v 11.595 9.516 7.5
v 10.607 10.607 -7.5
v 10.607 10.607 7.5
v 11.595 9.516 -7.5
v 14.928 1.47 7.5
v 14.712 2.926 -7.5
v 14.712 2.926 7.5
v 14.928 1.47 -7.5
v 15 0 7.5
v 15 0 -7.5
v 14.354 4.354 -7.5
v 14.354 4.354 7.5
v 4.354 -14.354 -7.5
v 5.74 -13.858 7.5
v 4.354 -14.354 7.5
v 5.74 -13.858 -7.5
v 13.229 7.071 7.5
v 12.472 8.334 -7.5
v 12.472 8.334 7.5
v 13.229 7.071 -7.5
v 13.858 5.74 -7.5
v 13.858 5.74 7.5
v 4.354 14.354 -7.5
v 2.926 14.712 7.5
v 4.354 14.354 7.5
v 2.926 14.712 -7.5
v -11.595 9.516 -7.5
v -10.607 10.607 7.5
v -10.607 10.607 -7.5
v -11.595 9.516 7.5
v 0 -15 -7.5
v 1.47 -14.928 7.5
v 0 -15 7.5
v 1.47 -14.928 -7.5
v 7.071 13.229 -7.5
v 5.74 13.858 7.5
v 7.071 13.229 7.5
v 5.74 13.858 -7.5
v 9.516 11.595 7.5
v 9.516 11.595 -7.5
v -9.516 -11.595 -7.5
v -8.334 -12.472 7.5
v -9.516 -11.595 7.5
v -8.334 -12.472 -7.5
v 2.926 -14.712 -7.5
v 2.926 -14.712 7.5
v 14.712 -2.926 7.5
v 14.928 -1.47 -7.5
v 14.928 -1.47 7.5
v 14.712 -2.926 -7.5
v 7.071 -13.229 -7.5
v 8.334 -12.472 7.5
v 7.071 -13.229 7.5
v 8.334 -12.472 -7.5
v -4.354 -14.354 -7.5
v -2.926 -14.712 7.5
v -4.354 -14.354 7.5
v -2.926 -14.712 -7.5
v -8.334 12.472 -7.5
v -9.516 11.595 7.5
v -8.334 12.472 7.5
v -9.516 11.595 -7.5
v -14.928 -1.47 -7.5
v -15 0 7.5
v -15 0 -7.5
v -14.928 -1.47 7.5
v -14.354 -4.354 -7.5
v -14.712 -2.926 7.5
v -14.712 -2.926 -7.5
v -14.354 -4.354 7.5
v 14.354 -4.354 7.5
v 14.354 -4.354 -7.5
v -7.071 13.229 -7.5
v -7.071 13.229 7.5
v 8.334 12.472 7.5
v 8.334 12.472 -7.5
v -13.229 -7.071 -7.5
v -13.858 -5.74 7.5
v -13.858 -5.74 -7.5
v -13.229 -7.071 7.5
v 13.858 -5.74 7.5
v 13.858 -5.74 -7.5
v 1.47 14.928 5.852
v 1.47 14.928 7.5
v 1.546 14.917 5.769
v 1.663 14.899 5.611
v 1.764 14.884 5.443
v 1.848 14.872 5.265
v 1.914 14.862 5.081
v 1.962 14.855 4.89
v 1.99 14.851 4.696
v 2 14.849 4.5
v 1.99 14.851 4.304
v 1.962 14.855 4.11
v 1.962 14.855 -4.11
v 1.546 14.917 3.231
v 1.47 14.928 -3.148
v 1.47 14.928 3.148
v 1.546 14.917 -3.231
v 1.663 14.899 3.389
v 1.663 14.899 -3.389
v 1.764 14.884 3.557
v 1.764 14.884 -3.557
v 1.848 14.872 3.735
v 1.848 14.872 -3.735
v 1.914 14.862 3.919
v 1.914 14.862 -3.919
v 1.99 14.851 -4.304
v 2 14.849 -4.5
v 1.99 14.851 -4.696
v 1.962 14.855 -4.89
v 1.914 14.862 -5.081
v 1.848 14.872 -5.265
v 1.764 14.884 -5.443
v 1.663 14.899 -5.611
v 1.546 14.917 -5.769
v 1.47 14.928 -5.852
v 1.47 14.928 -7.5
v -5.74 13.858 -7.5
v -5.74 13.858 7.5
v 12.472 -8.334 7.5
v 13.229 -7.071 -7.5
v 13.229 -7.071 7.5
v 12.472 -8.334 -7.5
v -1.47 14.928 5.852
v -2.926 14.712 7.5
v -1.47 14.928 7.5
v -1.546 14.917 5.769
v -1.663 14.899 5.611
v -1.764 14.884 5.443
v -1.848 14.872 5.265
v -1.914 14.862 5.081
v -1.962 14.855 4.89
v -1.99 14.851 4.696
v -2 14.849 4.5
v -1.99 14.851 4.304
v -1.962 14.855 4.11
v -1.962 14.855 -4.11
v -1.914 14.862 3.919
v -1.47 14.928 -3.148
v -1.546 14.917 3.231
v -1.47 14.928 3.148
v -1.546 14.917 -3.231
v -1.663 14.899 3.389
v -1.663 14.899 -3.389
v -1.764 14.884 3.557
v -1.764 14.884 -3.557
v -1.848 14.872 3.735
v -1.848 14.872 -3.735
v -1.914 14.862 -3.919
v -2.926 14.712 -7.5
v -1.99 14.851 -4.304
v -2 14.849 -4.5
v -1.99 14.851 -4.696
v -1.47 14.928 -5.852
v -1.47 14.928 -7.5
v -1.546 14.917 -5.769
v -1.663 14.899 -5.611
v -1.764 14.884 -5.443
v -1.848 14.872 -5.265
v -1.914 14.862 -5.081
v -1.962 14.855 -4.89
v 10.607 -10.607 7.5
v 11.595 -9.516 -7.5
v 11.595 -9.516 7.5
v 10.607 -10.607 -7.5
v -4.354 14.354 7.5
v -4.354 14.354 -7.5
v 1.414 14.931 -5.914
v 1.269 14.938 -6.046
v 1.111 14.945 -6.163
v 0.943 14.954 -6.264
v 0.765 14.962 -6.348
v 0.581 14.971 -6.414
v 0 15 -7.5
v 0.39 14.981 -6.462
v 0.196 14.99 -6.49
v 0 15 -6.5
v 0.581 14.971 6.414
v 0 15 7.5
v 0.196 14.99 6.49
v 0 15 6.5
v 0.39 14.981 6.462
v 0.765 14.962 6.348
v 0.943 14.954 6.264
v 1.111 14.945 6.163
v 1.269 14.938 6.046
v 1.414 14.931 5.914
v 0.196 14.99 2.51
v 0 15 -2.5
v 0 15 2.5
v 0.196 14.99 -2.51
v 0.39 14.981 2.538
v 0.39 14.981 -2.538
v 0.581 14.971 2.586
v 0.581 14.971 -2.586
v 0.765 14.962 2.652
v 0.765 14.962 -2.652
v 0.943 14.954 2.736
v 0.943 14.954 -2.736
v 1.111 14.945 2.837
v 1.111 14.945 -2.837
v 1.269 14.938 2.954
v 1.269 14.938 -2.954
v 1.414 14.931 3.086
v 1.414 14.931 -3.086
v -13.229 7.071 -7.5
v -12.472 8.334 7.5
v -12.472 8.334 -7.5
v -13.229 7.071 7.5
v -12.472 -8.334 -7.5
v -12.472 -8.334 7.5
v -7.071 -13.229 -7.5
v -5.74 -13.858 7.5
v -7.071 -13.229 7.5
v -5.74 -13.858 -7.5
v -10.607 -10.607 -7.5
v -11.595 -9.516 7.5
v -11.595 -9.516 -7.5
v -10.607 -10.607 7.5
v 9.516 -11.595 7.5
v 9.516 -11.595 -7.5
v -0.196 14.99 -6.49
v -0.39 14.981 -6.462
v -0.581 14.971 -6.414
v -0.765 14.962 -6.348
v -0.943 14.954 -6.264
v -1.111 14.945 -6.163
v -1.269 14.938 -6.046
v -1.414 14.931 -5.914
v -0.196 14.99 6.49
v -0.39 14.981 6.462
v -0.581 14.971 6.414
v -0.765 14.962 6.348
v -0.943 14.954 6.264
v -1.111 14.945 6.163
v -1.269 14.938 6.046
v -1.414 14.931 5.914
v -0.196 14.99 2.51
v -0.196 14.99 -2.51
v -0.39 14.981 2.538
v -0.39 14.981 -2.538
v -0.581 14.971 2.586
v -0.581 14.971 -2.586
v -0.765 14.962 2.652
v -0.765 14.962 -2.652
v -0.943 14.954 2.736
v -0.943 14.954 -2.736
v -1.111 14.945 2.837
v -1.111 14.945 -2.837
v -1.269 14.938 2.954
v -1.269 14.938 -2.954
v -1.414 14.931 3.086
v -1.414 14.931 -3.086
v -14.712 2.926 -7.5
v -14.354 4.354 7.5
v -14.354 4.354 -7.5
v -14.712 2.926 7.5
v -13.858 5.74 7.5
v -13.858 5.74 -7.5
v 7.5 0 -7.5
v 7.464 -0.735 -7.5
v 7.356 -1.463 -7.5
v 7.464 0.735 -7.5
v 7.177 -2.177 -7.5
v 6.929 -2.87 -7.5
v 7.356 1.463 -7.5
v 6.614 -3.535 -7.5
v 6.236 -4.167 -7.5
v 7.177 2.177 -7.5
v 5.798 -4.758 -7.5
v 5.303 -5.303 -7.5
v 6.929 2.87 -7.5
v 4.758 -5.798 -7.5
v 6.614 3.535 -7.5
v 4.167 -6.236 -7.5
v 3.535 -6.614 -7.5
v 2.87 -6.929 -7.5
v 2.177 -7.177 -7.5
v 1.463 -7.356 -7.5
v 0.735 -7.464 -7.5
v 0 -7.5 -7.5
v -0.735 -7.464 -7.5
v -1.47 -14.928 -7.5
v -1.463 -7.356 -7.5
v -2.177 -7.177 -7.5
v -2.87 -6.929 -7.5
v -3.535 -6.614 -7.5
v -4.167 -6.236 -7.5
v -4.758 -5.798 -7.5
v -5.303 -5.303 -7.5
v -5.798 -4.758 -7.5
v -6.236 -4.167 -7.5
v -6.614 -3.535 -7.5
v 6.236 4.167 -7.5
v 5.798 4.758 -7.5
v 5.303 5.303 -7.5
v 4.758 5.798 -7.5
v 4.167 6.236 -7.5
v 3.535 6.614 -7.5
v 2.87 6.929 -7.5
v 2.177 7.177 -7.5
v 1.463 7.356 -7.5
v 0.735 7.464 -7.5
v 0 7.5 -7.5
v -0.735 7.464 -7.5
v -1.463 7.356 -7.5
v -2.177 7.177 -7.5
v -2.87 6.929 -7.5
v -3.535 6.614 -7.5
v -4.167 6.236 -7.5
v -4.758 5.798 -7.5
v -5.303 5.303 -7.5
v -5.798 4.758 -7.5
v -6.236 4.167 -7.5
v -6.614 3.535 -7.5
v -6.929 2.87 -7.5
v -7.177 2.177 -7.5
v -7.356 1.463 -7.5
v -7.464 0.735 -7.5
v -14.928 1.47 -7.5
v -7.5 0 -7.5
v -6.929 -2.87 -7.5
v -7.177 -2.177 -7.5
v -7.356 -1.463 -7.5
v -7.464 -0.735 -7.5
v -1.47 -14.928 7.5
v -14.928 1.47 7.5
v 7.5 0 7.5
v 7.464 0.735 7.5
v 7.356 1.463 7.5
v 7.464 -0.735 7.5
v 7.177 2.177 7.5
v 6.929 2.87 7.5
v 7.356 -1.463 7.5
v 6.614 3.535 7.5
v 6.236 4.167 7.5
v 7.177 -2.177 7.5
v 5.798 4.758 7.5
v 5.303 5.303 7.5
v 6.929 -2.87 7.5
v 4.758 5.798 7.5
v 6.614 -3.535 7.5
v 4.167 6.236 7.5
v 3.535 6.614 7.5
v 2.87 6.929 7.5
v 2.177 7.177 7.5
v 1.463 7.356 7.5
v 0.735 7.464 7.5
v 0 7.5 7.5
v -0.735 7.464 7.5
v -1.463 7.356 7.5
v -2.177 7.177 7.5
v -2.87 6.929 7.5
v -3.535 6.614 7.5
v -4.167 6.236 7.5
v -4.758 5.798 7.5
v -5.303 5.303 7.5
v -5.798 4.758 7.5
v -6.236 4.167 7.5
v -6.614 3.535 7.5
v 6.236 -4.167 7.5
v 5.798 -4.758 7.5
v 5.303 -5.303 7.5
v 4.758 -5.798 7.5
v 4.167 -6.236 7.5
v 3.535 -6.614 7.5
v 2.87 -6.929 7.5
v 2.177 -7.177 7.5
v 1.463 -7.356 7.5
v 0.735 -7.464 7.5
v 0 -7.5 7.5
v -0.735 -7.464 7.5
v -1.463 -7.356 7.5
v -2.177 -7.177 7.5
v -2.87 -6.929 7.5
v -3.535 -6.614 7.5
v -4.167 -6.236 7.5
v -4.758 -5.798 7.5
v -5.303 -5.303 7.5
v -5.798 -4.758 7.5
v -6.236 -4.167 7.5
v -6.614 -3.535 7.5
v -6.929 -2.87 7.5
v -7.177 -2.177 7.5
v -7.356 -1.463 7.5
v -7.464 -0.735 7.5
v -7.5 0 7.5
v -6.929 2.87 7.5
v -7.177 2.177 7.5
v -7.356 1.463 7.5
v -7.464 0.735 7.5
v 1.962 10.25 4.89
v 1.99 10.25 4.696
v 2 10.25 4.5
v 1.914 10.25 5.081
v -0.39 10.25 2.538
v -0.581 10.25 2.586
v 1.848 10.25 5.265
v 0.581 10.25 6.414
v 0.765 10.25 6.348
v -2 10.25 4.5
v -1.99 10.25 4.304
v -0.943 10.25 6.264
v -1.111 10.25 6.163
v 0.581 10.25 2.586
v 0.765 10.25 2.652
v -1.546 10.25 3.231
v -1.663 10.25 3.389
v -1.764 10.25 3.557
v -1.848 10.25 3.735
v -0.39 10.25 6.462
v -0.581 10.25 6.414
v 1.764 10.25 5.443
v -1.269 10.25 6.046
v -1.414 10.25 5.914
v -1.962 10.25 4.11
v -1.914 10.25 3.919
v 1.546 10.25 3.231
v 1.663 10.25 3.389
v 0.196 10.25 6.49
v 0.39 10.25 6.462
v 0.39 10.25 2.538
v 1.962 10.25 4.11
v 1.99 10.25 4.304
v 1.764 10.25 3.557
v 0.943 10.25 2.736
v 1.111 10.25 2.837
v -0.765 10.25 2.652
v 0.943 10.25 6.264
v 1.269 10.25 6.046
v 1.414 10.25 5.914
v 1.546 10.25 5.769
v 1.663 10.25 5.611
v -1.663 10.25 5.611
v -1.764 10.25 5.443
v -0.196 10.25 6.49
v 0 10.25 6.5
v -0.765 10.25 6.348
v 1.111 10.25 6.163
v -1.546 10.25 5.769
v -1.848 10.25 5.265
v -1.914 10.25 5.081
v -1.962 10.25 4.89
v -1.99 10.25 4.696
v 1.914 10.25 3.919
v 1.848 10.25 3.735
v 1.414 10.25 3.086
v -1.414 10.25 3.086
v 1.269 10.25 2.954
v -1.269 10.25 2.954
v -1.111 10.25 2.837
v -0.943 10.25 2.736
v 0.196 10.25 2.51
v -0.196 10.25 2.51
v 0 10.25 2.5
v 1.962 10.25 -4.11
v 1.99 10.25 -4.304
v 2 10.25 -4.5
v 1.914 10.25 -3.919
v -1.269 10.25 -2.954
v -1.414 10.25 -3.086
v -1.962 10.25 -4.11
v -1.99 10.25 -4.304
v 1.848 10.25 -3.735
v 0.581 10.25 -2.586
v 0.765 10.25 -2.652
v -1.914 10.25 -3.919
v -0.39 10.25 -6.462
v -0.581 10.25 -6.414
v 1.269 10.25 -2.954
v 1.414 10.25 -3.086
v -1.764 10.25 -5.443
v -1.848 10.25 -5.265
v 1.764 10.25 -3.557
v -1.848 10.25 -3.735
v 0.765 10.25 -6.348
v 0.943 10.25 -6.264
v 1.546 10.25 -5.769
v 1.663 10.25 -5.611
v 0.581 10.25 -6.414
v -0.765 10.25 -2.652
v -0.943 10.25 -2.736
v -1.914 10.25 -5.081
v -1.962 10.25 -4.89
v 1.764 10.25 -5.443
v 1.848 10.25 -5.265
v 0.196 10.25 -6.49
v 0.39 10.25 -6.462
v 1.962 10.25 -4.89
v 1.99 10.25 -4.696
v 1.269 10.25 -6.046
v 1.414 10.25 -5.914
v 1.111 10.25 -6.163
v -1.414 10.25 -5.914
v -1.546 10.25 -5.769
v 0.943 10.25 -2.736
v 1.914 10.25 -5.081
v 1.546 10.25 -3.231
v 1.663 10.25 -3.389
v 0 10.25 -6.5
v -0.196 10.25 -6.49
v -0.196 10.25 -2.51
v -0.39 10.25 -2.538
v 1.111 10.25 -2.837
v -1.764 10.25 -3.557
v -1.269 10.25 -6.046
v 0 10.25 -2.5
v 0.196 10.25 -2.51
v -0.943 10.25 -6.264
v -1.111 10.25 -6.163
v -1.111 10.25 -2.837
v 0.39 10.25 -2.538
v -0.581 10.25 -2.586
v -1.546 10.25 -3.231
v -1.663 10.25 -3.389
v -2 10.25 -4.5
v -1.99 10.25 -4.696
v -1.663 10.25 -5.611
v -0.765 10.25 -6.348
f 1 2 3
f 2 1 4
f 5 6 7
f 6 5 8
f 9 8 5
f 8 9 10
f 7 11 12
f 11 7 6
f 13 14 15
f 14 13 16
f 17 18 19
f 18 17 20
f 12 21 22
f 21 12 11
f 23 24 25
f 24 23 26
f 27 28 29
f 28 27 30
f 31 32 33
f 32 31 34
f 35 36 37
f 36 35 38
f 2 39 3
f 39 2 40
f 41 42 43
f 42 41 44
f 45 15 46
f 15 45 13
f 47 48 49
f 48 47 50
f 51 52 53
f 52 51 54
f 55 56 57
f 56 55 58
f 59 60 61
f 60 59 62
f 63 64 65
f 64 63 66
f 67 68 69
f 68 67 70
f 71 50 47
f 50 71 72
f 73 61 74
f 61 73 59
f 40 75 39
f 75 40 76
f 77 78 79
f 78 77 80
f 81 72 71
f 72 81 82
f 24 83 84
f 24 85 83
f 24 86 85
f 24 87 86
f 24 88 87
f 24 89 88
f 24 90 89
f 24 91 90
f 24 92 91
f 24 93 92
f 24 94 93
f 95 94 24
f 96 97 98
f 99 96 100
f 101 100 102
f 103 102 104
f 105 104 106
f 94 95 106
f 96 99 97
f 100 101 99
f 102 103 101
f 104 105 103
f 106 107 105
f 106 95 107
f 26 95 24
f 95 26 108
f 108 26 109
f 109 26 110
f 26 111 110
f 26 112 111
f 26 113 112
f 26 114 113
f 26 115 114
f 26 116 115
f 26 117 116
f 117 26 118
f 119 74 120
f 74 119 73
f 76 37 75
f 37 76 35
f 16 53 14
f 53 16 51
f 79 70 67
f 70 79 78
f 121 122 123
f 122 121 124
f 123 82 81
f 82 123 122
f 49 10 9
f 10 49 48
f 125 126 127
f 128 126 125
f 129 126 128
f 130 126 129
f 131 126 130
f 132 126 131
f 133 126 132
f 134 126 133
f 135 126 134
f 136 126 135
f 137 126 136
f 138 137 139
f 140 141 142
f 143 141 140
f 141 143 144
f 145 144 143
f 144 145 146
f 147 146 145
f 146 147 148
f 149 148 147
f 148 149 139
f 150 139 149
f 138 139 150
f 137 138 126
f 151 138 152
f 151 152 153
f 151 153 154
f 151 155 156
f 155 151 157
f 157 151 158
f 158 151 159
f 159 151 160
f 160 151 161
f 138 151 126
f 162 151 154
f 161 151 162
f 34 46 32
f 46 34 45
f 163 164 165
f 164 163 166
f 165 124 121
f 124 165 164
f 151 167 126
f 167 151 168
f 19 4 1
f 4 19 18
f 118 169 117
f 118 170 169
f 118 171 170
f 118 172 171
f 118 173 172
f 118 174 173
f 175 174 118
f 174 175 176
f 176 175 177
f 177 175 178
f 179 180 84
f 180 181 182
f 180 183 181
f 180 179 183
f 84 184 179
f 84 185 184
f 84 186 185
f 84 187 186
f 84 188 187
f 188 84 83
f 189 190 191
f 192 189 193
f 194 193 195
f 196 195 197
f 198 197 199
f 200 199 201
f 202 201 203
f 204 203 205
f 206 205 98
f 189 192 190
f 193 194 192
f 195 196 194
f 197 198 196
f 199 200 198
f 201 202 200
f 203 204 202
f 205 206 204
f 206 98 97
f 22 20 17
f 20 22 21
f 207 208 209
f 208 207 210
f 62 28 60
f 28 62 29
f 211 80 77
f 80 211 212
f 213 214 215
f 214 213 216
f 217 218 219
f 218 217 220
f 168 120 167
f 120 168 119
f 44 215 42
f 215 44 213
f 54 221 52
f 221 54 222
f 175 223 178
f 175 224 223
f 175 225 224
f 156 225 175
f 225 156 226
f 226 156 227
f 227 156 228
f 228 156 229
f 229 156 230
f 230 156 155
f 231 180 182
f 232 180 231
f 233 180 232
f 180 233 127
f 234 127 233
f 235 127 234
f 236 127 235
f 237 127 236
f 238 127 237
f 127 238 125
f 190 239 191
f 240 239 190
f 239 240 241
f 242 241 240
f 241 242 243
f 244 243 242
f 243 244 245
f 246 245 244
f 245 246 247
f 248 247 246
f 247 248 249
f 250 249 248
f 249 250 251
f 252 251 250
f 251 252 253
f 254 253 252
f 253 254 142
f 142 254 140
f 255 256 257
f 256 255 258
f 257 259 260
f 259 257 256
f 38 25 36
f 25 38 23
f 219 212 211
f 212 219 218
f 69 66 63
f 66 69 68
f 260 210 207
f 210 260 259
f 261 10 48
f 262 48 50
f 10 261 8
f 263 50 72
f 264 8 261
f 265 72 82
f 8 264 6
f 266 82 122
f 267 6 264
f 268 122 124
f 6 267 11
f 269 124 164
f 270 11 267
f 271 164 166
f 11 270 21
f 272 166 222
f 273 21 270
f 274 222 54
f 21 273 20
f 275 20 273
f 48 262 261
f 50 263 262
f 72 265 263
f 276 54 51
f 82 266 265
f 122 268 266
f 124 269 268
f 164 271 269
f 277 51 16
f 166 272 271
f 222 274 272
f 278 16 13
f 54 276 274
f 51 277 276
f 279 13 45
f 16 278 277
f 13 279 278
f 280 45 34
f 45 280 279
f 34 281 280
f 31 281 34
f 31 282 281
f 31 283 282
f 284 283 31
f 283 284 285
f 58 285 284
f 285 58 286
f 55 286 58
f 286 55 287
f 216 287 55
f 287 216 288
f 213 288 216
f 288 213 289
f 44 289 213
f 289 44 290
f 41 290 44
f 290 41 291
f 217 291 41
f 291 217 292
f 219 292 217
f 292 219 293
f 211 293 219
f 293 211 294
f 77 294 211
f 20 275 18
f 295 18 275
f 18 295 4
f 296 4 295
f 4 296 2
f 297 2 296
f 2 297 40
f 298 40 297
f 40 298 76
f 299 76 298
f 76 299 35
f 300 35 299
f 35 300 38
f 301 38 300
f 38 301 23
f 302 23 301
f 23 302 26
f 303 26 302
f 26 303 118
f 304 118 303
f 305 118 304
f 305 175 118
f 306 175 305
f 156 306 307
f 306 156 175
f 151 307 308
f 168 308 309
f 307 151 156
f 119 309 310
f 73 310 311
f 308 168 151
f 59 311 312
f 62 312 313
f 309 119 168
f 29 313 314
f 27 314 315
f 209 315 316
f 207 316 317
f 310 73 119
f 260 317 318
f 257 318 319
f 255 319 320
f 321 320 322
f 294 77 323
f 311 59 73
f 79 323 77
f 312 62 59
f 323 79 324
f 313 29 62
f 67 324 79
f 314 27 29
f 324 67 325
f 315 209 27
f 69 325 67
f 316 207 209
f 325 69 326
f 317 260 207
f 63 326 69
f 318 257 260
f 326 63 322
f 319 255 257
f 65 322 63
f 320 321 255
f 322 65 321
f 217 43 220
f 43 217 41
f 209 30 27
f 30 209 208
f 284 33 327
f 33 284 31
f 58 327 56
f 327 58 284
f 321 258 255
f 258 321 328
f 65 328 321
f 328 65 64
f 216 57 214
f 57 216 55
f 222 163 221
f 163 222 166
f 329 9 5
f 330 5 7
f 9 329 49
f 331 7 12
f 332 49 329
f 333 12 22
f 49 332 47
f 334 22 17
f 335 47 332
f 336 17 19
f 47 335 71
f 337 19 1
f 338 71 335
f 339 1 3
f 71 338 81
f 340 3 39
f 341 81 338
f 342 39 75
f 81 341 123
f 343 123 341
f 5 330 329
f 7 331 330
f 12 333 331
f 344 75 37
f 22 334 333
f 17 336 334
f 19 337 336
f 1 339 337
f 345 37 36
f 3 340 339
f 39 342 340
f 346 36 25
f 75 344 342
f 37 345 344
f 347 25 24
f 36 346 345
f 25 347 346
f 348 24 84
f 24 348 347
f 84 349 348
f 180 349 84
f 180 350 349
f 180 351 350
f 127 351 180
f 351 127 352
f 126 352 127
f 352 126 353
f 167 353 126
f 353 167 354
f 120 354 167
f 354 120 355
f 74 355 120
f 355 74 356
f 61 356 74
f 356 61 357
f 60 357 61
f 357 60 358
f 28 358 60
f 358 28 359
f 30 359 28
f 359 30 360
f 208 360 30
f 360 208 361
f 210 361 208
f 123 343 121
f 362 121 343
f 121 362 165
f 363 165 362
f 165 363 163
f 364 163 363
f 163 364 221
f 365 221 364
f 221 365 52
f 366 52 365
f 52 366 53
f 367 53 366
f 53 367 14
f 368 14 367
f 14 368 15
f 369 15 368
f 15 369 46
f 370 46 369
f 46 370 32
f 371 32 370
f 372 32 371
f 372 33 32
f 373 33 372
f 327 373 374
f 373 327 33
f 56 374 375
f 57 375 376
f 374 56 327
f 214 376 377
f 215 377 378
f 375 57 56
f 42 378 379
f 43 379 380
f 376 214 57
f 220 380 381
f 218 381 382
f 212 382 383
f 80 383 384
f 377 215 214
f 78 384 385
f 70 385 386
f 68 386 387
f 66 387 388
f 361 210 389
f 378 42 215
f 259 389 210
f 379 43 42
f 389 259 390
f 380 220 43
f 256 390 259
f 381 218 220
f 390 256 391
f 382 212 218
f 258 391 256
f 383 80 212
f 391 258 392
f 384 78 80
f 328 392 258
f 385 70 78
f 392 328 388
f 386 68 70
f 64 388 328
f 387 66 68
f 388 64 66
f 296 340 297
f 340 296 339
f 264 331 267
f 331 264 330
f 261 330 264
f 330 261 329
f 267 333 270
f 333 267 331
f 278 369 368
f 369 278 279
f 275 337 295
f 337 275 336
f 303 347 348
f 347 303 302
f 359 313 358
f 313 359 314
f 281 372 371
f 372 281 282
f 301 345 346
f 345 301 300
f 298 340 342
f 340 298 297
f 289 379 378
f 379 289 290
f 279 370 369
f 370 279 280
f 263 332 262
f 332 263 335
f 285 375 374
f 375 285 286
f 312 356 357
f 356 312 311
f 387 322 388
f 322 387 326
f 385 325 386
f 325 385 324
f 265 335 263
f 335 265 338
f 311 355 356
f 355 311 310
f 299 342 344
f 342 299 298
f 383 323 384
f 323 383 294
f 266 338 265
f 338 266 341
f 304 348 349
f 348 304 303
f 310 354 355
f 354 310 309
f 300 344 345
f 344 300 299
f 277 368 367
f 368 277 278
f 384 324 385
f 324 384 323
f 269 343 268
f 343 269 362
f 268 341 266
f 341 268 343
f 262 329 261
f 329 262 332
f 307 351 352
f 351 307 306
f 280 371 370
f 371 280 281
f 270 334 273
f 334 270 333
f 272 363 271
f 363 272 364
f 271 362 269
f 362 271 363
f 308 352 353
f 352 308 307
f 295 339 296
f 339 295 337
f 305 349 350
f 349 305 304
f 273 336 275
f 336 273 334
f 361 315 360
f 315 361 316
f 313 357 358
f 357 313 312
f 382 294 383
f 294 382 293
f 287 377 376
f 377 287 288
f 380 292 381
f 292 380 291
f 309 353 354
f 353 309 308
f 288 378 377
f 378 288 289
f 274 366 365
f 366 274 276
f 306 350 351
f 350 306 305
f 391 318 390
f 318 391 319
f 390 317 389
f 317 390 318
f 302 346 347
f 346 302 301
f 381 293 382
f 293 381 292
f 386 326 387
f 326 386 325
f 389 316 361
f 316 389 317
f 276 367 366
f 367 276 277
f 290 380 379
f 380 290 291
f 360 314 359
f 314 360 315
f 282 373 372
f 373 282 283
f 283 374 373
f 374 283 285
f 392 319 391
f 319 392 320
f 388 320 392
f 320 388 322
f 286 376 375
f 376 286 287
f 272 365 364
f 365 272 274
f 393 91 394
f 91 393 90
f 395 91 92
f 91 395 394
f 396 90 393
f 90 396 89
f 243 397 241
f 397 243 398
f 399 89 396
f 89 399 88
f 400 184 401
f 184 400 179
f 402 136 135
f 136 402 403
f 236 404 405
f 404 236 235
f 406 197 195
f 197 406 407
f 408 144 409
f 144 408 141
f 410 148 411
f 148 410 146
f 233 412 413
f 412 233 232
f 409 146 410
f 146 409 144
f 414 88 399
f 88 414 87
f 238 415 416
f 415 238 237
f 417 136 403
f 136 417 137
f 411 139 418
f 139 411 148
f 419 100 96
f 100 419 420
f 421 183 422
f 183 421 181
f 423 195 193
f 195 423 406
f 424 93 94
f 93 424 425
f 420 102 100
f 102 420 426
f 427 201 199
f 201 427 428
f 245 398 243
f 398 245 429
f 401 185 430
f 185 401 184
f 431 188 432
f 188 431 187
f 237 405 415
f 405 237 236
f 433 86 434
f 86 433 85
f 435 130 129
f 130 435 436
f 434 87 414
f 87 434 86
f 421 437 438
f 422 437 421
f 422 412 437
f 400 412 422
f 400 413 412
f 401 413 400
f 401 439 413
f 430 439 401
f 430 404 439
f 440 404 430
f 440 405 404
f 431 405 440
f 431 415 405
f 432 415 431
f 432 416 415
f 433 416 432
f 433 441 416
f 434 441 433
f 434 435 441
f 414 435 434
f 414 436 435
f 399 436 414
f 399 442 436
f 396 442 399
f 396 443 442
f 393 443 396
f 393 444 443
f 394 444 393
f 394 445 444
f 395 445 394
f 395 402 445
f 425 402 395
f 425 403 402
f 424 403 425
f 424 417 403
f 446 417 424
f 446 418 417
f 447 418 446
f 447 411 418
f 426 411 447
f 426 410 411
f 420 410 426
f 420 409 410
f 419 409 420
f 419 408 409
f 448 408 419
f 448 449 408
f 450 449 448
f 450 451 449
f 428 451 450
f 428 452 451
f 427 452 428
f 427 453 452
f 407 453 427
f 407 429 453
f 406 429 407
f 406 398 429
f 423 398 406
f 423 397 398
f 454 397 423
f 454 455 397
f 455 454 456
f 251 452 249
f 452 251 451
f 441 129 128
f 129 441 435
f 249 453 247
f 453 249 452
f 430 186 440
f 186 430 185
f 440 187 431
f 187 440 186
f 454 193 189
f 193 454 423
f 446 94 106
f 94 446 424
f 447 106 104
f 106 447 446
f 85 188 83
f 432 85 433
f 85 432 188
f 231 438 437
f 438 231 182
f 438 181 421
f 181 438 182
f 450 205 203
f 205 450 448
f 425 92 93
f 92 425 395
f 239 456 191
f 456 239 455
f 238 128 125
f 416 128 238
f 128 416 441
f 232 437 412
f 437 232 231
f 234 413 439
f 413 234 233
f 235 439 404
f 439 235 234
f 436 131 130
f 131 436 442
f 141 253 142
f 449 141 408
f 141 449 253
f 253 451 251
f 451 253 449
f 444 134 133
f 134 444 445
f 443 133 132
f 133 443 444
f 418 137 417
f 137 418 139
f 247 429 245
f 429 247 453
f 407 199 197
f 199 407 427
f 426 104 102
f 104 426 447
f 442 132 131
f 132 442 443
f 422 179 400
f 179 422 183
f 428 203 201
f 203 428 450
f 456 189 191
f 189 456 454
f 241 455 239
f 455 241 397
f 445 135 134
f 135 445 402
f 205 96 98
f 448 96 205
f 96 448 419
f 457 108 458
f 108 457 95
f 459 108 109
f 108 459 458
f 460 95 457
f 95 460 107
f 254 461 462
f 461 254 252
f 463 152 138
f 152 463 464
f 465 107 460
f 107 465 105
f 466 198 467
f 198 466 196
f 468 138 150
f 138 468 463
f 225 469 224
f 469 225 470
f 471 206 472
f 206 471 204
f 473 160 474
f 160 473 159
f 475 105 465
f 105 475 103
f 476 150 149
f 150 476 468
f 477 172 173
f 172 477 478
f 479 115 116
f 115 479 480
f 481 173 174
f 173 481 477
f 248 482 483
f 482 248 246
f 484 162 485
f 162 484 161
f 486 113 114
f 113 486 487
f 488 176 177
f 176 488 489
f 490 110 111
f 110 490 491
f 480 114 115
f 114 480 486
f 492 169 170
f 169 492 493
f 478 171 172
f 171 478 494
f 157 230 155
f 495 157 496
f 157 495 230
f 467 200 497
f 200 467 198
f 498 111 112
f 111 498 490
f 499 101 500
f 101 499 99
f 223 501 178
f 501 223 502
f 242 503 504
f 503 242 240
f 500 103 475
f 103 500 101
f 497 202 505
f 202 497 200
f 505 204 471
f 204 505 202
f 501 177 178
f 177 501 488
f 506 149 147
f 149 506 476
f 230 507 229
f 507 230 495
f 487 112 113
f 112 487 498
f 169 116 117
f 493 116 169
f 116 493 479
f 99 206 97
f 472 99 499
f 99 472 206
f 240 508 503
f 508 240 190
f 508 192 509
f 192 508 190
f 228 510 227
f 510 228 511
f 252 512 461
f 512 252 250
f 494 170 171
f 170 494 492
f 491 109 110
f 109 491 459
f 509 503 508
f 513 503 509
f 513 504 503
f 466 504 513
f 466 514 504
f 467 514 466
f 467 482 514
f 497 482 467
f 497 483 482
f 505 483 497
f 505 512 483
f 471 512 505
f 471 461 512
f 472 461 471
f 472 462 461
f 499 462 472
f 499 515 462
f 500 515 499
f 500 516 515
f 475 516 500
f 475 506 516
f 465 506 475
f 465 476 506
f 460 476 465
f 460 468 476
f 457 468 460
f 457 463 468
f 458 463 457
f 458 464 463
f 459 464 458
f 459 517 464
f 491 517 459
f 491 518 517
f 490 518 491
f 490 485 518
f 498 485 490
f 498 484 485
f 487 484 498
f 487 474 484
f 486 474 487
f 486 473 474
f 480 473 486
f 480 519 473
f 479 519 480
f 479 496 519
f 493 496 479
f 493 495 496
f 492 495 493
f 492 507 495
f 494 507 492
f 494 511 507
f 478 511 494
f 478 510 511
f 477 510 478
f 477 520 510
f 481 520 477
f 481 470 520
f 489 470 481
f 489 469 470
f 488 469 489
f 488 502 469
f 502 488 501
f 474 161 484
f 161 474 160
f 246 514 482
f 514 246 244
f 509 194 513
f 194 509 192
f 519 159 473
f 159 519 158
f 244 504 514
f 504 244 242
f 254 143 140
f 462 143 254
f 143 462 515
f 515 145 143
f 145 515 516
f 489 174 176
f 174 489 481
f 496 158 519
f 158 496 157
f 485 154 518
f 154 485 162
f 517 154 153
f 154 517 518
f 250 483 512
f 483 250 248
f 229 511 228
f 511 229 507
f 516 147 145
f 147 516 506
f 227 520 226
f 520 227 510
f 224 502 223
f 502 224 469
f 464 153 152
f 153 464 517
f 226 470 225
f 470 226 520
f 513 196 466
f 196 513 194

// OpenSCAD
// COBRA Vertebra - C1 V0
// Height: 15.0mm, OD: 30.0mm

$fn = 64;

difference() {
    // Outer cylinder
    cylinder(h=15.0, d=30.0, center=true);
    
    // Inner channel
    cylinder(h=17.0, d=15.0, center=true);

    // Pivot holes
    translate([0, 15.0, 4.5])
    rotate([90, 0, 0])
    cylinder(h=9.5, d=4, center=true);
    
    translate([0, 15.0, -4.5])
    rotate([90, 0, 0])
    cylinder(h=9.5, d=4, center=true);
}
